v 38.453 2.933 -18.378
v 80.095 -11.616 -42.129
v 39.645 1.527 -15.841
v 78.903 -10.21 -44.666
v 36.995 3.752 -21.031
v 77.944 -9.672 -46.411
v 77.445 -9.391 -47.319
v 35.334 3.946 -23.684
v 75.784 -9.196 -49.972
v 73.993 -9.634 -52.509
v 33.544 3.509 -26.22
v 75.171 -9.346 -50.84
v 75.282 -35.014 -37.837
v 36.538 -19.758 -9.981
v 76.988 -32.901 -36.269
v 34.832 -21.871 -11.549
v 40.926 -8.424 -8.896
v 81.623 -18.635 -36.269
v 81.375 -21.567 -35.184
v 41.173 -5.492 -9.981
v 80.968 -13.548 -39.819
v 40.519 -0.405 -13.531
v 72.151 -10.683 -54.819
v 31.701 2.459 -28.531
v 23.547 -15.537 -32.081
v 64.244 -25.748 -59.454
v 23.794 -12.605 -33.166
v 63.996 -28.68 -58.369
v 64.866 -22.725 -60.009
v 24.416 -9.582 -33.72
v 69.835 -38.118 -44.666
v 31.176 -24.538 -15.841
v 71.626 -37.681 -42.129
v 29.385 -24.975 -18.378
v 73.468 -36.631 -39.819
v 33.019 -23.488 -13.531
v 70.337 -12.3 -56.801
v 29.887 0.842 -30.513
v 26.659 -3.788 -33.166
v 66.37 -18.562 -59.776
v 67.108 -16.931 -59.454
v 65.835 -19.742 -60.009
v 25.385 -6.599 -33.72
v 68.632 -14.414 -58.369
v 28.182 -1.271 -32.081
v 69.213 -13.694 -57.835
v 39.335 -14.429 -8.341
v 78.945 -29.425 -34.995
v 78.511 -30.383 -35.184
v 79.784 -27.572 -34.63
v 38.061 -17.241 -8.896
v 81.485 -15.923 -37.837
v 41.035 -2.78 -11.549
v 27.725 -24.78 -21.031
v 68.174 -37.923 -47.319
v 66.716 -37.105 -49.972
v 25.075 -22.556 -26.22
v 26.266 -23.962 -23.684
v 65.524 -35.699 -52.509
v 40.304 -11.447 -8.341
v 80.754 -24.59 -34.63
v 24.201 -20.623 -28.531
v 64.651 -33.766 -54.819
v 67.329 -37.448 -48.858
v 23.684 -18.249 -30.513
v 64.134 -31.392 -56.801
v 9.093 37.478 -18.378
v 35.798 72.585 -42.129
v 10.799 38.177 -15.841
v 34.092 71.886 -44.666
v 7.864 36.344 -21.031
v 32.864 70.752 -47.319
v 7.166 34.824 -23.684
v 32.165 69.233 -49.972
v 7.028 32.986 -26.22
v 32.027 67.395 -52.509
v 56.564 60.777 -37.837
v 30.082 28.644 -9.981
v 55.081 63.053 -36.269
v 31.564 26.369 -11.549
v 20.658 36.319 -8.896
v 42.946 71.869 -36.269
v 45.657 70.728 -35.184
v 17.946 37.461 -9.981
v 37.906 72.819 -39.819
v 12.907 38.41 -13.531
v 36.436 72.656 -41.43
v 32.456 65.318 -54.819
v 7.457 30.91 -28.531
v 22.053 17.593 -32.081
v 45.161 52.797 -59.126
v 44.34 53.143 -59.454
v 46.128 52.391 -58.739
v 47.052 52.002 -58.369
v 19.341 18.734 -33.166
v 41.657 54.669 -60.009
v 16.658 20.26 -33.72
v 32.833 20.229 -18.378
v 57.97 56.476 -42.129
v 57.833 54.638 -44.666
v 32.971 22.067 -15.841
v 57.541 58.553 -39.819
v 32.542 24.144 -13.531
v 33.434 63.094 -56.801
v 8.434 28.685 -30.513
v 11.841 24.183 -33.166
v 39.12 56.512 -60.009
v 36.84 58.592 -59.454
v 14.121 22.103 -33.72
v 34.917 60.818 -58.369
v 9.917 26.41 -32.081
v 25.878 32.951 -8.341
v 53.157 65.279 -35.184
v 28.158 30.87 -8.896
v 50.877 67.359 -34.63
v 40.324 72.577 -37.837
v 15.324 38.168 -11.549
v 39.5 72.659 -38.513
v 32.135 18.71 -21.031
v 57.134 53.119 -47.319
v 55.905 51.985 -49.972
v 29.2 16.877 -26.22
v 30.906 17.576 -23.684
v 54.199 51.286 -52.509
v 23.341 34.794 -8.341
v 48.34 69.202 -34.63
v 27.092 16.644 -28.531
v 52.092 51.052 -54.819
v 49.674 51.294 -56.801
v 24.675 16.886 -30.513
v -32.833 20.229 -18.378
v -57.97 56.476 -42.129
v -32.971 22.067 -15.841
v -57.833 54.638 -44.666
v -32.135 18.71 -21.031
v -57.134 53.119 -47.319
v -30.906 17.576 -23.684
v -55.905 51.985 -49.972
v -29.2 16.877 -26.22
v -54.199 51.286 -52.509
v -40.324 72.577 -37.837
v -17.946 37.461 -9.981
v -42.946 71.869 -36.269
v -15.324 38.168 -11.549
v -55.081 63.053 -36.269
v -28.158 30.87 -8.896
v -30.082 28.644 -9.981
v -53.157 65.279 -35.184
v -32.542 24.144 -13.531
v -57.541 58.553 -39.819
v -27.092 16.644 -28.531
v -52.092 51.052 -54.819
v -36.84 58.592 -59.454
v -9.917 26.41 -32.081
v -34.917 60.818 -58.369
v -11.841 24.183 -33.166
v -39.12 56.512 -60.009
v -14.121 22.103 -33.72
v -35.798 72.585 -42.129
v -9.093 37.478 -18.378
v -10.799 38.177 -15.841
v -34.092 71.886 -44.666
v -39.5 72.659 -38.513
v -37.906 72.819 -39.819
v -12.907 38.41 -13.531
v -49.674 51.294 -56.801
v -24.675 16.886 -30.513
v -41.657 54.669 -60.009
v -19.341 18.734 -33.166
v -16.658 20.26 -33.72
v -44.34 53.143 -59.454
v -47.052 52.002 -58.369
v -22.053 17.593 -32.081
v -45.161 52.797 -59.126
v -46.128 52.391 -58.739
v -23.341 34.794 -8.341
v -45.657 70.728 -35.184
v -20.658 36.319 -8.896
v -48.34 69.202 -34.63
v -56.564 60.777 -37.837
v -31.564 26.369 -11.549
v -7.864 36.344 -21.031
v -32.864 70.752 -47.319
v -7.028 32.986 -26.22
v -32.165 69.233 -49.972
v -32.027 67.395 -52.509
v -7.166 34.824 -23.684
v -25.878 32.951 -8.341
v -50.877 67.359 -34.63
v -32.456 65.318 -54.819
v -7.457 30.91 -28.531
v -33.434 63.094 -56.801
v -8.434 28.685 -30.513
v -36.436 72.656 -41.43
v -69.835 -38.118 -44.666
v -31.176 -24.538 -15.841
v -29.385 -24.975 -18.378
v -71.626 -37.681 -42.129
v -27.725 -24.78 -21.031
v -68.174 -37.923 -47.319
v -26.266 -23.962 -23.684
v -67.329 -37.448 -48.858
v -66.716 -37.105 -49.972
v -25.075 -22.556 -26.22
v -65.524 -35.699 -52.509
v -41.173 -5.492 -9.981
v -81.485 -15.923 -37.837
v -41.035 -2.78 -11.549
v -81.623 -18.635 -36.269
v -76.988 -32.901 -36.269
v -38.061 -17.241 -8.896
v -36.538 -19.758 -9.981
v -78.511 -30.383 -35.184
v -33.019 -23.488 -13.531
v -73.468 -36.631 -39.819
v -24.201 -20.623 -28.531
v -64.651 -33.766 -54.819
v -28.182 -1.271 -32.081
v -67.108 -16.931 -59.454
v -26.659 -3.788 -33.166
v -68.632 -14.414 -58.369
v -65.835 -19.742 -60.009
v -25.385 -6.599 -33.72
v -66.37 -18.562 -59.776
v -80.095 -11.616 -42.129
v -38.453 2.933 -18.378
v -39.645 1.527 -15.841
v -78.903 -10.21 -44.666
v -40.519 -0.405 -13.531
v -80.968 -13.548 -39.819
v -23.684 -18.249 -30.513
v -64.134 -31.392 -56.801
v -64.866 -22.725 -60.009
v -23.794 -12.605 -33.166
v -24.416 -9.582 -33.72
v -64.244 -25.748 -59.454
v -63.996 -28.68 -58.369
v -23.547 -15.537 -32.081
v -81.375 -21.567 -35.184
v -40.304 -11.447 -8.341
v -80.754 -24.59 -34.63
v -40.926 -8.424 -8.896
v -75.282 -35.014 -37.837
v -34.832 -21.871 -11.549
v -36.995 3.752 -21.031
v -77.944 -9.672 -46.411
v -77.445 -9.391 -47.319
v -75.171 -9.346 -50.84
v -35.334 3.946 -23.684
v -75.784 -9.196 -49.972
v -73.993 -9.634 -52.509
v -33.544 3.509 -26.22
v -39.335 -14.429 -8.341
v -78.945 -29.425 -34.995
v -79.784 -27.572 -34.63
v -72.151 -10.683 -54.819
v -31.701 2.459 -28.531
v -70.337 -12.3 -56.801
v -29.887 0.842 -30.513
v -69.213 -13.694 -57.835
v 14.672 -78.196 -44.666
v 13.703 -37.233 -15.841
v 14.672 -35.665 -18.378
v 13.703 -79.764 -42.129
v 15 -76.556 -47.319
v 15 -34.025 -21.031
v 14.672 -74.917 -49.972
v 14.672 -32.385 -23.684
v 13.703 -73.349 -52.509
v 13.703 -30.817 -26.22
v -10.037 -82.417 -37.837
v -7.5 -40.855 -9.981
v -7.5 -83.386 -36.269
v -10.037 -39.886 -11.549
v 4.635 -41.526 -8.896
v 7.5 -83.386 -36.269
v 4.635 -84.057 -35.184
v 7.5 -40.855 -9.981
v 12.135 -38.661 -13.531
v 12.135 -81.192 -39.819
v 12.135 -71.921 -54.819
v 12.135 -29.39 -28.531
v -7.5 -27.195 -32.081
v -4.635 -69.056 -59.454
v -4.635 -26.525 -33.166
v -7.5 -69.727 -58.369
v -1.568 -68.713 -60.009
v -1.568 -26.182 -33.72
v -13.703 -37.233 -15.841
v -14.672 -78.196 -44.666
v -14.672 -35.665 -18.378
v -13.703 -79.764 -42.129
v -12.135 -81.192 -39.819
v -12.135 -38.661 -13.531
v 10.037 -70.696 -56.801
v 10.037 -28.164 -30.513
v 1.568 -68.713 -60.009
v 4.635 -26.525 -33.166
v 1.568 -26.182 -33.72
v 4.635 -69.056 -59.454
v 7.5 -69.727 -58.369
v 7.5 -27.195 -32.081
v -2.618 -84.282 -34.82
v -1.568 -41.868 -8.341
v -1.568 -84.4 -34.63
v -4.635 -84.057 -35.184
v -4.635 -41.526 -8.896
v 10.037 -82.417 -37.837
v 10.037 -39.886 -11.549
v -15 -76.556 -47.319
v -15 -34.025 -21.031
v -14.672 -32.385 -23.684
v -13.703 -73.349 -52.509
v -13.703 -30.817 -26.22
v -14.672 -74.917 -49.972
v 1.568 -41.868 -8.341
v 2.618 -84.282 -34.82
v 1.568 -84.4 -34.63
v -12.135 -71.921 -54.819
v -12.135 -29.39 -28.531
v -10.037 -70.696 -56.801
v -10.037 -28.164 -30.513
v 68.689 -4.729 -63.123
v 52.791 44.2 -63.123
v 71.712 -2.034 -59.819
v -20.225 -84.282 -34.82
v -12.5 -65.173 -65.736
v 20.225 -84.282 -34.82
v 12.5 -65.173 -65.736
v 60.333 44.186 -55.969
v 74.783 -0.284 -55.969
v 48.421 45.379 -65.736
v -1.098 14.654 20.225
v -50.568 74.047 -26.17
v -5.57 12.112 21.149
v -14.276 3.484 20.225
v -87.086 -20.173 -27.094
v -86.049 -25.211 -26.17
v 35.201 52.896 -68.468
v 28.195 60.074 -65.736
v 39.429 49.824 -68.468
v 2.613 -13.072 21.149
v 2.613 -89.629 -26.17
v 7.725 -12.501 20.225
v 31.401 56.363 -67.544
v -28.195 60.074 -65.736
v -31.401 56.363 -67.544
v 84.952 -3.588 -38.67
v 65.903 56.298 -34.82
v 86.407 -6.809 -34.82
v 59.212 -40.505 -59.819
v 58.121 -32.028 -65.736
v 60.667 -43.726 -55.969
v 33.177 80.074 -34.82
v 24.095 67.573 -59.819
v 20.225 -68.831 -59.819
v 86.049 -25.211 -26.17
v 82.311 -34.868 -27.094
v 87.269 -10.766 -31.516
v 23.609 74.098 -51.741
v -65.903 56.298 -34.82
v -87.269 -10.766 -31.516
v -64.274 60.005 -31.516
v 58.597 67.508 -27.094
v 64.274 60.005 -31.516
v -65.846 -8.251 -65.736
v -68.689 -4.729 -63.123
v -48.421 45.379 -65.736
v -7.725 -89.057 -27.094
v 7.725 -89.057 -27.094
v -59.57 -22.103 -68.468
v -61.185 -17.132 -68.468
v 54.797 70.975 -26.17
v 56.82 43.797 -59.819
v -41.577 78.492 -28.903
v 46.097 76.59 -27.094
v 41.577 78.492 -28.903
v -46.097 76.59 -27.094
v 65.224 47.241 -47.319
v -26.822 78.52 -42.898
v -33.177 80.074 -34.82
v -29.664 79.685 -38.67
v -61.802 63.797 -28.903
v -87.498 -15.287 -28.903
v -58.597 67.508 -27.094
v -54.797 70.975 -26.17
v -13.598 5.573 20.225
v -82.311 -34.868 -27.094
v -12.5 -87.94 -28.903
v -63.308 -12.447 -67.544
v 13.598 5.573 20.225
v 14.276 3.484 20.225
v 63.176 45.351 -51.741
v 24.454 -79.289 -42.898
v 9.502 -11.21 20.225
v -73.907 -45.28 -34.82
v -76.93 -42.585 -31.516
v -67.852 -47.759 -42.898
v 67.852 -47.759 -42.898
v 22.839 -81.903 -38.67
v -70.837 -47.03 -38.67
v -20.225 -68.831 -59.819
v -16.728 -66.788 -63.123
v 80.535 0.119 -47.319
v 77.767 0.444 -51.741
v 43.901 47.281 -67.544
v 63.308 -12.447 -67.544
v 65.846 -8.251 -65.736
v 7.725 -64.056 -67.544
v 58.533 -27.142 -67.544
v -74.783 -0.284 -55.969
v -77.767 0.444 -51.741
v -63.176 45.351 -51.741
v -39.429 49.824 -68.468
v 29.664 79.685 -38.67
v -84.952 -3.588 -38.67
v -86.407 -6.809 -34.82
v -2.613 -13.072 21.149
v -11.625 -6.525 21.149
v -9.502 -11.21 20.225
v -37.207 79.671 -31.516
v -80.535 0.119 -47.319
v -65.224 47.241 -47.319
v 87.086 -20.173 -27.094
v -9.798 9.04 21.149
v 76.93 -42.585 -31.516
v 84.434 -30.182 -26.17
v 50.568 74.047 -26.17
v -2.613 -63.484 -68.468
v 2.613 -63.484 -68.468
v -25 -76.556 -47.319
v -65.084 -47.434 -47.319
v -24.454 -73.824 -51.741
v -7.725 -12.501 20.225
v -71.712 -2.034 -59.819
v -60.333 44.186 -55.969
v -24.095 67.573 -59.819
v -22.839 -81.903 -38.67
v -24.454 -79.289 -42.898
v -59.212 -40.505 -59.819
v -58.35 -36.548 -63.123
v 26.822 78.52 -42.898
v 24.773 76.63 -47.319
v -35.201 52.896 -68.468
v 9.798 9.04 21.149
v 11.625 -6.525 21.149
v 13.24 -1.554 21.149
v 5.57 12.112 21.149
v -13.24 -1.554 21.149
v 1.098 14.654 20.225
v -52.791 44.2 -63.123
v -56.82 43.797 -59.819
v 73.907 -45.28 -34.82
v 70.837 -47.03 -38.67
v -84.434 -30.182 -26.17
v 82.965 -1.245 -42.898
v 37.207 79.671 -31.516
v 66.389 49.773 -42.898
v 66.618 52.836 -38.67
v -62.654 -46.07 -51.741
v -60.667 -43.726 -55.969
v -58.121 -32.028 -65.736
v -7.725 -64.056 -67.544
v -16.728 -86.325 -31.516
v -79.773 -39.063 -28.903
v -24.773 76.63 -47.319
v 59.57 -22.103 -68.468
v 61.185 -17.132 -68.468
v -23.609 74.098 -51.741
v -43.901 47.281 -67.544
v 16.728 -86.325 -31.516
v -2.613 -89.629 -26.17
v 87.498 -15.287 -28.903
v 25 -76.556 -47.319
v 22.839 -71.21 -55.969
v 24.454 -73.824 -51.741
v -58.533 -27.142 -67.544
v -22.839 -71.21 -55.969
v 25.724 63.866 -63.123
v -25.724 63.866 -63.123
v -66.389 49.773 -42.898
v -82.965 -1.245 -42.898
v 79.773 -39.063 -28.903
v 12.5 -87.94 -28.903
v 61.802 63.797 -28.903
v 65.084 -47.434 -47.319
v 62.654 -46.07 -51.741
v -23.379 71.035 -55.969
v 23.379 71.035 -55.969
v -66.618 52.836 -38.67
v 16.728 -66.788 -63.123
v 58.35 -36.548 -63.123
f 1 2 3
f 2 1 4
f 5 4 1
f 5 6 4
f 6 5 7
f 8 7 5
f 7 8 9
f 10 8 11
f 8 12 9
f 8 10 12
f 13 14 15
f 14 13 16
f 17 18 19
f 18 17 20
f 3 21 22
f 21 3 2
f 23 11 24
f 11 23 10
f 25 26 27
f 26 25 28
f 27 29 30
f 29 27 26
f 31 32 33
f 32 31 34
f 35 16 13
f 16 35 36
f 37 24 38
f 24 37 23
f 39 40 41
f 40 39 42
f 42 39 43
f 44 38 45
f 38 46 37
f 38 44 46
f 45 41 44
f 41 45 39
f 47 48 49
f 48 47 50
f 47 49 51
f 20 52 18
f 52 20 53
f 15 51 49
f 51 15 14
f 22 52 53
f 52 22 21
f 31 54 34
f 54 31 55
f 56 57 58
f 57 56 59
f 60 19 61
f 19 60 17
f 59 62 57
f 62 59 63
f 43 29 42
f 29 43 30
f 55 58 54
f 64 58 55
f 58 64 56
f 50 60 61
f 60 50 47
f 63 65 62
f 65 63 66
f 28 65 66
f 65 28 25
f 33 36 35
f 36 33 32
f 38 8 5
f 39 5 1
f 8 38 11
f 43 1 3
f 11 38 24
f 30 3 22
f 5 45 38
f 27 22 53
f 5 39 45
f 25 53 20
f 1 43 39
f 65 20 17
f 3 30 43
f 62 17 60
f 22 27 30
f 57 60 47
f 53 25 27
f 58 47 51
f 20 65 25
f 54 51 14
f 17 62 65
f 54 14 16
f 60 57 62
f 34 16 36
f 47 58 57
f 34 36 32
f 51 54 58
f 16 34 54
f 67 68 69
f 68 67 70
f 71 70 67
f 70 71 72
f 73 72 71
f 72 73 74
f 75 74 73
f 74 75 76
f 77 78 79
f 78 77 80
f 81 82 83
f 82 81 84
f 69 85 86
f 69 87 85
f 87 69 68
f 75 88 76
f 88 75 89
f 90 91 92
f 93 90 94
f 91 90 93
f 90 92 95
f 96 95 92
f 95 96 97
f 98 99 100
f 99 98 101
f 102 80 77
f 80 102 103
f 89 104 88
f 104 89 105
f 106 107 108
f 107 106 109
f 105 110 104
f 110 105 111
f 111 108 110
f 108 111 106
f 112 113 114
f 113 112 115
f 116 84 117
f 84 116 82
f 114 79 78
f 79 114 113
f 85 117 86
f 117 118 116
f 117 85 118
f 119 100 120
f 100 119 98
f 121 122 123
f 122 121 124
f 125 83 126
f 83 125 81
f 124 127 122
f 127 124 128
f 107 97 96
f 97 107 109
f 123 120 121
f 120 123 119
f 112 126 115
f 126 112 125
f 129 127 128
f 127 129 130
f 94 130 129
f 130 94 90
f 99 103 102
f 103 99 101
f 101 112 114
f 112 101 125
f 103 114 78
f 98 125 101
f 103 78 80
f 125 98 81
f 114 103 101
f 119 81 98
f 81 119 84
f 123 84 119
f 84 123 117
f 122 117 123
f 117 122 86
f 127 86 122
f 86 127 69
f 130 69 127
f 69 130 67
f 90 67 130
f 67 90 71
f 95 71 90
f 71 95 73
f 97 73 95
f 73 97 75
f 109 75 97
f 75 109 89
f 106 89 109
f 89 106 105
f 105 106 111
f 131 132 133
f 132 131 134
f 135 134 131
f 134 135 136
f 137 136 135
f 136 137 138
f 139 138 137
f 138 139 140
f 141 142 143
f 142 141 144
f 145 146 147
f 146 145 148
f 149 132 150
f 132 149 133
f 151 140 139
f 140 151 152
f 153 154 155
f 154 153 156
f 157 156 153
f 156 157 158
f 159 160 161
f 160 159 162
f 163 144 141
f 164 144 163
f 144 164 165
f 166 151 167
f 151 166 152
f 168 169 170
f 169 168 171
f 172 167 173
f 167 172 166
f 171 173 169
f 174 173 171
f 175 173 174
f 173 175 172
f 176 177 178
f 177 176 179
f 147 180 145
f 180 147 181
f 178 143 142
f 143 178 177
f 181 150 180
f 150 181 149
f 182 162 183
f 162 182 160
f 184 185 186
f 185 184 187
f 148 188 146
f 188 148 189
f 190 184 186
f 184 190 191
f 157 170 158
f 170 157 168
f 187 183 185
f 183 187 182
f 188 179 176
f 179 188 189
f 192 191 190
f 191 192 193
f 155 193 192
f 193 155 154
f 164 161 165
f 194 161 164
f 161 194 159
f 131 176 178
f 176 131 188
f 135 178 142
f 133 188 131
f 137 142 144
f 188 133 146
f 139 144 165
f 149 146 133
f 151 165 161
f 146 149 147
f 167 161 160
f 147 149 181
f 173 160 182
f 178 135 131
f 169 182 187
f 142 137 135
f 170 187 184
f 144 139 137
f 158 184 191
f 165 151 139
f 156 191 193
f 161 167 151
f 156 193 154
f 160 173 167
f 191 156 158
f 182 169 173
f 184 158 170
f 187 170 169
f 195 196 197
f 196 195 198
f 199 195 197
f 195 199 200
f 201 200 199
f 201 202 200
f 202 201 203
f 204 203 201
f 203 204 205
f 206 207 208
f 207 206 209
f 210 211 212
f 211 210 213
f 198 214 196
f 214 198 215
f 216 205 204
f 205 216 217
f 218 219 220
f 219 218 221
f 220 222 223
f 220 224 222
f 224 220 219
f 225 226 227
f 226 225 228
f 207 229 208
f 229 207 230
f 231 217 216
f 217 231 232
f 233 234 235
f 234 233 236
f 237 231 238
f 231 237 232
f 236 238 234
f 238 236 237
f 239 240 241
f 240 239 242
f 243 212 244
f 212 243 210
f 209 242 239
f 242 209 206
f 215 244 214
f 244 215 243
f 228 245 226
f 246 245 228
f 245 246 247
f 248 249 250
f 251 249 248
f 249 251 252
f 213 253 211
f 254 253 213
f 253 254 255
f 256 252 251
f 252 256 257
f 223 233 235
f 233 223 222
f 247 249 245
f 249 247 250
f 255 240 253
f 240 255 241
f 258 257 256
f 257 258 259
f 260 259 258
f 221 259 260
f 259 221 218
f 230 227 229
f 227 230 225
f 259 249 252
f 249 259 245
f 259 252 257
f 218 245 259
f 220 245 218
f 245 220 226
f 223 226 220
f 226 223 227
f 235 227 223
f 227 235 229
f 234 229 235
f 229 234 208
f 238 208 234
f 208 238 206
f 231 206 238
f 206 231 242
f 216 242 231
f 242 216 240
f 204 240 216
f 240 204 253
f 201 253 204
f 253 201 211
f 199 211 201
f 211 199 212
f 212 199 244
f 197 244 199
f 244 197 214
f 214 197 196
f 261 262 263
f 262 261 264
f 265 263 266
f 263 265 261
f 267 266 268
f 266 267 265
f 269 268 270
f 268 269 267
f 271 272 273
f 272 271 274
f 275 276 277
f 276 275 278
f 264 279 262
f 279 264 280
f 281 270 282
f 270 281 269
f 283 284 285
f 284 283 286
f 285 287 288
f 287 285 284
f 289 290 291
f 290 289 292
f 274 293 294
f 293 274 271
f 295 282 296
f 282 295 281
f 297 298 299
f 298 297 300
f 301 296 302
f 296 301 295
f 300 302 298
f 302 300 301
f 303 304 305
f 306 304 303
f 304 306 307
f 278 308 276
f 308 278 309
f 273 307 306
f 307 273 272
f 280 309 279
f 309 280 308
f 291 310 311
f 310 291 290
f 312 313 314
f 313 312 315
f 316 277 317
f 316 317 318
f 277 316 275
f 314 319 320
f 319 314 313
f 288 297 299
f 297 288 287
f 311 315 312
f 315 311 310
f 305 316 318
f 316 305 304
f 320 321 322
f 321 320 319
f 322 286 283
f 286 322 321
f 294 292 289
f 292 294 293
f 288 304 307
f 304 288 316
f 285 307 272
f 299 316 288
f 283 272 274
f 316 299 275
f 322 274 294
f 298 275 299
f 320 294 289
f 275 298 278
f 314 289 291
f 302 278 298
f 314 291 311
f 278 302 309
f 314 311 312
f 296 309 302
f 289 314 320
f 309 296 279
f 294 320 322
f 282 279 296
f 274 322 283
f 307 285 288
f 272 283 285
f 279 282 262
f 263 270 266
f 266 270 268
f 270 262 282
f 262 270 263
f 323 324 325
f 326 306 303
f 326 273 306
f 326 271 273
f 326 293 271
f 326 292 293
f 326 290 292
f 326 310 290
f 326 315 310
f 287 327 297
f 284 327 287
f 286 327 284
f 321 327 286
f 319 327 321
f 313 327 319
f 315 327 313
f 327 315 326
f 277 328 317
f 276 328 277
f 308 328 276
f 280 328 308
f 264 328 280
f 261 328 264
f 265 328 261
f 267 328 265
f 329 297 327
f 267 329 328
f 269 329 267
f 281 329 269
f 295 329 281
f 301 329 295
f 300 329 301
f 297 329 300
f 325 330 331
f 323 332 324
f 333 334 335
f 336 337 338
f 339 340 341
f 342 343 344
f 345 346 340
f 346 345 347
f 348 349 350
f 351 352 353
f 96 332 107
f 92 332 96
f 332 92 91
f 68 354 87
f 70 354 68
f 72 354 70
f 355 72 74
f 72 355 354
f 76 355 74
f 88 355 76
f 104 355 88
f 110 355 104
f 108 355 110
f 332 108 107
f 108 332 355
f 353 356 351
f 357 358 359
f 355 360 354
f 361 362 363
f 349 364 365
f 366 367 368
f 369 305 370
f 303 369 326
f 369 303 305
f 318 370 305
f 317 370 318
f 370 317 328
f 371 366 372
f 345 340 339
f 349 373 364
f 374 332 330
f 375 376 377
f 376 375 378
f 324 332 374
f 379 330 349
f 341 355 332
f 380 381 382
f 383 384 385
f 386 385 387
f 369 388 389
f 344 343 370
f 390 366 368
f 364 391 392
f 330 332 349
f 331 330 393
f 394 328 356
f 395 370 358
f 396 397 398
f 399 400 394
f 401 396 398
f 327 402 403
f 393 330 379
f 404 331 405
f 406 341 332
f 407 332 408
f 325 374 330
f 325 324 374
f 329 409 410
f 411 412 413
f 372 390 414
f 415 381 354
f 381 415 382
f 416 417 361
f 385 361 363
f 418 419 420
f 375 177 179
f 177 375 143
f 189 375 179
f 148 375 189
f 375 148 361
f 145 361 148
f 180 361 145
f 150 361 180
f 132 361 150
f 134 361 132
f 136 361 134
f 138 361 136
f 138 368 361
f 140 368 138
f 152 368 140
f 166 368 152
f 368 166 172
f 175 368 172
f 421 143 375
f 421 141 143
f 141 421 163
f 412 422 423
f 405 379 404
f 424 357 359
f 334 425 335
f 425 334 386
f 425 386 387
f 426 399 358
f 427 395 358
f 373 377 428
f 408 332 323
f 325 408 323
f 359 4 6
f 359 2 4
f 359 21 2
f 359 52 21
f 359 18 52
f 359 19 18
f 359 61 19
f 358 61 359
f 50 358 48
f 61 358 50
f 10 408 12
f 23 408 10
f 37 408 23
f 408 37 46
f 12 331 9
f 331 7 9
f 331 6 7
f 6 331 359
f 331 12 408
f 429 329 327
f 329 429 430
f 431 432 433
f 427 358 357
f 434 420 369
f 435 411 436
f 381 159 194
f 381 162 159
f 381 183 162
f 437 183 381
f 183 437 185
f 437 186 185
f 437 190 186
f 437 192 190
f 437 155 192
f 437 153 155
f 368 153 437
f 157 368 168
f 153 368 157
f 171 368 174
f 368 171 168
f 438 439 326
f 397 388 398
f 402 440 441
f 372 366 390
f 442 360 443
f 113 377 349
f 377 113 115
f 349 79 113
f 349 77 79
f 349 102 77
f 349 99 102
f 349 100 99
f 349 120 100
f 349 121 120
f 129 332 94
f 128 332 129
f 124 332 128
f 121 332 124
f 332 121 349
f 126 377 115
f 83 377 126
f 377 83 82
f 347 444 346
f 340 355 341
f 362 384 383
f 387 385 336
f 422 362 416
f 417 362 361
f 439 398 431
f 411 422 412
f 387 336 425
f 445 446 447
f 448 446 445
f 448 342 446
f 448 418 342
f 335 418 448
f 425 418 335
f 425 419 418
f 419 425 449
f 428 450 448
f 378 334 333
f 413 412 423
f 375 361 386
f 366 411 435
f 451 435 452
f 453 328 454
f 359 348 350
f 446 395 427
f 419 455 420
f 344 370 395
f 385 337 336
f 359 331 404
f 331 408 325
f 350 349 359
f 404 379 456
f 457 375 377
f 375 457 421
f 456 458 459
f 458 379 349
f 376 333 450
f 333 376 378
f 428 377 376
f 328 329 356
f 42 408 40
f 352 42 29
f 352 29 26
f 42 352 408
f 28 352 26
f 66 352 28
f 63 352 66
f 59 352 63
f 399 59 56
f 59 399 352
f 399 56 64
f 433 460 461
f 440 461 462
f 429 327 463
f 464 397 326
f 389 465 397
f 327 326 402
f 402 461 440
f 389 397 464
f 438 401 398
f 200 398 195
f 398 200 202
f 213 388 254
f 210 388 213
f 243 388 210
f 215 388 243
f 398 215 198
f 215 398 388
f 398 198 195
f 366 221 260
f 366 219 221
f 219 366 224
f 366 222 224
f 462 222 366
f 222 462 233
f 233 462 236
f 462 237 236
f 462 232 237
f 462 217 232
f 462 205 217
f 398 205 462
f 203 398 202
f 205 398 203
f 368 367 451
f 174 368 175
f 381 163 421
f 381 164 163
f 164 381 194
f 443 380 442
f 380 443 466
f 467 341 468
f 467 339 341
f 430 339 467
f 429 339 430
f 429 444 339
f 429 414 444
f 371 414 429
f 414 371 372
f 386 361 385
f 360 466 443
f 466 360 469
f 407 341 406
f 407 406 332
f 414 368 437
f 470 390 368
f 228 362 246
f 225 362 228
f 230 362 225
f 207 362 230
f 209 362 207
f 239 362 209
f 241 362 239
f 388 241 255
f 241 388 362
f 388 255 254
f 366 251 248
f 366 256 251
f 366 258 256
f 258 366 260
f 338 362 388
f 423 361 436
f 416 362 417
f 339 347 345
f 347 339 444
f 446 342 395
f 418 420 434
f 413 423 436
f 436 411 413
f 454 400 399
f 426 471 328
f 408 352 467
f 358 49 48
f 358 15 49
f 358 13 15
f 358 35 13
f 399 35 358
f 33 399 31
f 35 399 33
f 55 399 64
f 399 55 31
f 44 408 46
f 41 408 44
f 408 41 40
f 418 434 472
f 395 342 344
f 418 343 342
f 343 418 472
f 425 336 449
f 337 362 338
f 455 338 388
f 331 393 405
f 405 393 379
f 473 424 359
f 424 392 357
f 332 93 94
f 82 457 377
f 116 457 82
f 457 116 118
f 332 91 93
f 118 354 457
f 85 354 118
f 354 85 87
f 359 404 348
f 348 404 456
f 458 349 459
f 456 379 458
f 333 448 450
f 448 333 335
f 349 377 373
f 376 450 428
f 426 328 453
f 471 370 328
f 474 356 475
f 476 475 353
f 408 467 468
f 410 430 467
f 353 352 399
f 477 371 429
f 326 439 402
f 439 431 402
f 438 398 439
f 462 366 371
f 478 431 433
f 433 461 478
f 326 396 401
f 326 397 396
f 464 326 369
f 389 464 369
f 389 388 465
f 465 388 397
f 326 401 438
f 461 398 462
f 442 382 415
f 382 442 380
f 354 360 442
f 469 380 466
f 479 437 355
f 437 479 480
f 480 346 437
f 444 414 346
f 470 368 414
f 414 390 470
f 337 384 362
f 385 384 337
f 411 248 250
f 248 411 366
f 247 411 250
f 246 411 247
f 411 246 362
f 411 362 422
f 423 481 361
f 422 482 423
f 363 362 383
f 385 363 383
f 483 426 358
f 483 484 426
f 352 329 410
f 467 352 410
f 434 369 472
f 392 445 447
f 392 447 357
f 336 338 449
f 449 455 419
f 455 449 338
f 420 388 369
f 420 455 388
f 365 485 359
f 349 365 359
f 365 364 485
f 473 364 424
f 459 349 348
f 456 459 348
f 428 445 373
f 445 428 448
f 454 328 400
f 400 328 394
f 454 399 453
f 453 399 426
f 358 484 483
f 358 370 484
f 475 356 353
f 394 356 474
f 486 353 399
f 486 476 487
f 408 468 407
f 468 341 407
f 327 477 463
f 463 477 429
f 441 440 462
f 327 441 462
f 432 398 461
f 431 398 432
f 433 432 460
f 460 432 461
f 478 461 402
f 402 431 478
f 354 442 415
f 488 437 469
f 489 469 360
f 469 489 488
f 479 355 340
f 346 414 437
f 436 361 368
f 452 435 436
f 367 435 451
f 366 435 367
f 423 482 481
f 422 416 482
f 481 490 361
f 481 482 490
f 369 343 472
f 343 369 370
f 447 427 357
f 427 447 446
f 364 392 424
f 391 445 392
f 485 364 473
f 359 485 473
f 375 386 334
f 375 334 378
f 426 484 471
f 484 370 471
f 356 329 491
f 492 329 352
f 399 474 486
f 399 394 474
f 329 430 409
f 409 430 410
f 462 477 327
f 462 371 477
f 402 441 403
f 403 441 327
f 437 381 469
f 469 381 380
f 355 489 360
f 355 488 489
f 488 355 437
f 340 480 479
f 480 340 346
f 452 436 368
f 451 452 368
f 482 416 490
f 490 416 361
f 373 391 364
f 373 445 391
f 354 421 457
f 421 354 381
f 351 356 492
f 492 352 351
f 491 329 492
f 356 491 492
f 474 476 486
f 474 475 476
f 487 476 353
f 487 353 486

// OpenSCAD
//Diameter of rod in centimeters
Rod_Diameter = 3;
//Depth of rod socket in centimeters
Rod_Depth = 5; 
// Wall thickness around rod.
Wall_Thickness = 1;

module GenConnector()
{
	Rod_Radius = (Rod_Diameter/2)*1000;
	Rod_Depth =  Rod_Depth*1000;
	Wall_Thickness = Wall_Thickness*1000;
    
	Distance_From_Core = (Rod_Radius*2)+Wall_Thickness;
	Total_Rod = Distance_From_Core + Rod_Depth; // Full rod size is Rod_Depth+Distance_From_Core
scale(0.01,0.01,0.01){	
	difference() {
		hull(){
			rotate([90,0,0]){
				for(i = [1 :5]){
					rotate([31.720,72.000*i,0]){
                        cylinder(r = (Rod_Radius+Wall_Thickness), h = Total_Rod ); // Outside Shape
					}
				}
			}
		}

		rotate([90,0,0]){
			for(i = [1 :5]){
				rotate([31.720,72.000*i,0]){
					difference() {
						cylinder(r = Rod_Radius, h = Total_Rod ); // Inside holes. h is distance from core, and Rod_Depth.
						cylinder(r = Rod_Radius, h = Distance_From_Core ); // Distance from core. Should be atleast  Diameter of rod //2990 (2540+500) 3040
					}
				}
			}
		}
	}
}
}

GenConnector();

